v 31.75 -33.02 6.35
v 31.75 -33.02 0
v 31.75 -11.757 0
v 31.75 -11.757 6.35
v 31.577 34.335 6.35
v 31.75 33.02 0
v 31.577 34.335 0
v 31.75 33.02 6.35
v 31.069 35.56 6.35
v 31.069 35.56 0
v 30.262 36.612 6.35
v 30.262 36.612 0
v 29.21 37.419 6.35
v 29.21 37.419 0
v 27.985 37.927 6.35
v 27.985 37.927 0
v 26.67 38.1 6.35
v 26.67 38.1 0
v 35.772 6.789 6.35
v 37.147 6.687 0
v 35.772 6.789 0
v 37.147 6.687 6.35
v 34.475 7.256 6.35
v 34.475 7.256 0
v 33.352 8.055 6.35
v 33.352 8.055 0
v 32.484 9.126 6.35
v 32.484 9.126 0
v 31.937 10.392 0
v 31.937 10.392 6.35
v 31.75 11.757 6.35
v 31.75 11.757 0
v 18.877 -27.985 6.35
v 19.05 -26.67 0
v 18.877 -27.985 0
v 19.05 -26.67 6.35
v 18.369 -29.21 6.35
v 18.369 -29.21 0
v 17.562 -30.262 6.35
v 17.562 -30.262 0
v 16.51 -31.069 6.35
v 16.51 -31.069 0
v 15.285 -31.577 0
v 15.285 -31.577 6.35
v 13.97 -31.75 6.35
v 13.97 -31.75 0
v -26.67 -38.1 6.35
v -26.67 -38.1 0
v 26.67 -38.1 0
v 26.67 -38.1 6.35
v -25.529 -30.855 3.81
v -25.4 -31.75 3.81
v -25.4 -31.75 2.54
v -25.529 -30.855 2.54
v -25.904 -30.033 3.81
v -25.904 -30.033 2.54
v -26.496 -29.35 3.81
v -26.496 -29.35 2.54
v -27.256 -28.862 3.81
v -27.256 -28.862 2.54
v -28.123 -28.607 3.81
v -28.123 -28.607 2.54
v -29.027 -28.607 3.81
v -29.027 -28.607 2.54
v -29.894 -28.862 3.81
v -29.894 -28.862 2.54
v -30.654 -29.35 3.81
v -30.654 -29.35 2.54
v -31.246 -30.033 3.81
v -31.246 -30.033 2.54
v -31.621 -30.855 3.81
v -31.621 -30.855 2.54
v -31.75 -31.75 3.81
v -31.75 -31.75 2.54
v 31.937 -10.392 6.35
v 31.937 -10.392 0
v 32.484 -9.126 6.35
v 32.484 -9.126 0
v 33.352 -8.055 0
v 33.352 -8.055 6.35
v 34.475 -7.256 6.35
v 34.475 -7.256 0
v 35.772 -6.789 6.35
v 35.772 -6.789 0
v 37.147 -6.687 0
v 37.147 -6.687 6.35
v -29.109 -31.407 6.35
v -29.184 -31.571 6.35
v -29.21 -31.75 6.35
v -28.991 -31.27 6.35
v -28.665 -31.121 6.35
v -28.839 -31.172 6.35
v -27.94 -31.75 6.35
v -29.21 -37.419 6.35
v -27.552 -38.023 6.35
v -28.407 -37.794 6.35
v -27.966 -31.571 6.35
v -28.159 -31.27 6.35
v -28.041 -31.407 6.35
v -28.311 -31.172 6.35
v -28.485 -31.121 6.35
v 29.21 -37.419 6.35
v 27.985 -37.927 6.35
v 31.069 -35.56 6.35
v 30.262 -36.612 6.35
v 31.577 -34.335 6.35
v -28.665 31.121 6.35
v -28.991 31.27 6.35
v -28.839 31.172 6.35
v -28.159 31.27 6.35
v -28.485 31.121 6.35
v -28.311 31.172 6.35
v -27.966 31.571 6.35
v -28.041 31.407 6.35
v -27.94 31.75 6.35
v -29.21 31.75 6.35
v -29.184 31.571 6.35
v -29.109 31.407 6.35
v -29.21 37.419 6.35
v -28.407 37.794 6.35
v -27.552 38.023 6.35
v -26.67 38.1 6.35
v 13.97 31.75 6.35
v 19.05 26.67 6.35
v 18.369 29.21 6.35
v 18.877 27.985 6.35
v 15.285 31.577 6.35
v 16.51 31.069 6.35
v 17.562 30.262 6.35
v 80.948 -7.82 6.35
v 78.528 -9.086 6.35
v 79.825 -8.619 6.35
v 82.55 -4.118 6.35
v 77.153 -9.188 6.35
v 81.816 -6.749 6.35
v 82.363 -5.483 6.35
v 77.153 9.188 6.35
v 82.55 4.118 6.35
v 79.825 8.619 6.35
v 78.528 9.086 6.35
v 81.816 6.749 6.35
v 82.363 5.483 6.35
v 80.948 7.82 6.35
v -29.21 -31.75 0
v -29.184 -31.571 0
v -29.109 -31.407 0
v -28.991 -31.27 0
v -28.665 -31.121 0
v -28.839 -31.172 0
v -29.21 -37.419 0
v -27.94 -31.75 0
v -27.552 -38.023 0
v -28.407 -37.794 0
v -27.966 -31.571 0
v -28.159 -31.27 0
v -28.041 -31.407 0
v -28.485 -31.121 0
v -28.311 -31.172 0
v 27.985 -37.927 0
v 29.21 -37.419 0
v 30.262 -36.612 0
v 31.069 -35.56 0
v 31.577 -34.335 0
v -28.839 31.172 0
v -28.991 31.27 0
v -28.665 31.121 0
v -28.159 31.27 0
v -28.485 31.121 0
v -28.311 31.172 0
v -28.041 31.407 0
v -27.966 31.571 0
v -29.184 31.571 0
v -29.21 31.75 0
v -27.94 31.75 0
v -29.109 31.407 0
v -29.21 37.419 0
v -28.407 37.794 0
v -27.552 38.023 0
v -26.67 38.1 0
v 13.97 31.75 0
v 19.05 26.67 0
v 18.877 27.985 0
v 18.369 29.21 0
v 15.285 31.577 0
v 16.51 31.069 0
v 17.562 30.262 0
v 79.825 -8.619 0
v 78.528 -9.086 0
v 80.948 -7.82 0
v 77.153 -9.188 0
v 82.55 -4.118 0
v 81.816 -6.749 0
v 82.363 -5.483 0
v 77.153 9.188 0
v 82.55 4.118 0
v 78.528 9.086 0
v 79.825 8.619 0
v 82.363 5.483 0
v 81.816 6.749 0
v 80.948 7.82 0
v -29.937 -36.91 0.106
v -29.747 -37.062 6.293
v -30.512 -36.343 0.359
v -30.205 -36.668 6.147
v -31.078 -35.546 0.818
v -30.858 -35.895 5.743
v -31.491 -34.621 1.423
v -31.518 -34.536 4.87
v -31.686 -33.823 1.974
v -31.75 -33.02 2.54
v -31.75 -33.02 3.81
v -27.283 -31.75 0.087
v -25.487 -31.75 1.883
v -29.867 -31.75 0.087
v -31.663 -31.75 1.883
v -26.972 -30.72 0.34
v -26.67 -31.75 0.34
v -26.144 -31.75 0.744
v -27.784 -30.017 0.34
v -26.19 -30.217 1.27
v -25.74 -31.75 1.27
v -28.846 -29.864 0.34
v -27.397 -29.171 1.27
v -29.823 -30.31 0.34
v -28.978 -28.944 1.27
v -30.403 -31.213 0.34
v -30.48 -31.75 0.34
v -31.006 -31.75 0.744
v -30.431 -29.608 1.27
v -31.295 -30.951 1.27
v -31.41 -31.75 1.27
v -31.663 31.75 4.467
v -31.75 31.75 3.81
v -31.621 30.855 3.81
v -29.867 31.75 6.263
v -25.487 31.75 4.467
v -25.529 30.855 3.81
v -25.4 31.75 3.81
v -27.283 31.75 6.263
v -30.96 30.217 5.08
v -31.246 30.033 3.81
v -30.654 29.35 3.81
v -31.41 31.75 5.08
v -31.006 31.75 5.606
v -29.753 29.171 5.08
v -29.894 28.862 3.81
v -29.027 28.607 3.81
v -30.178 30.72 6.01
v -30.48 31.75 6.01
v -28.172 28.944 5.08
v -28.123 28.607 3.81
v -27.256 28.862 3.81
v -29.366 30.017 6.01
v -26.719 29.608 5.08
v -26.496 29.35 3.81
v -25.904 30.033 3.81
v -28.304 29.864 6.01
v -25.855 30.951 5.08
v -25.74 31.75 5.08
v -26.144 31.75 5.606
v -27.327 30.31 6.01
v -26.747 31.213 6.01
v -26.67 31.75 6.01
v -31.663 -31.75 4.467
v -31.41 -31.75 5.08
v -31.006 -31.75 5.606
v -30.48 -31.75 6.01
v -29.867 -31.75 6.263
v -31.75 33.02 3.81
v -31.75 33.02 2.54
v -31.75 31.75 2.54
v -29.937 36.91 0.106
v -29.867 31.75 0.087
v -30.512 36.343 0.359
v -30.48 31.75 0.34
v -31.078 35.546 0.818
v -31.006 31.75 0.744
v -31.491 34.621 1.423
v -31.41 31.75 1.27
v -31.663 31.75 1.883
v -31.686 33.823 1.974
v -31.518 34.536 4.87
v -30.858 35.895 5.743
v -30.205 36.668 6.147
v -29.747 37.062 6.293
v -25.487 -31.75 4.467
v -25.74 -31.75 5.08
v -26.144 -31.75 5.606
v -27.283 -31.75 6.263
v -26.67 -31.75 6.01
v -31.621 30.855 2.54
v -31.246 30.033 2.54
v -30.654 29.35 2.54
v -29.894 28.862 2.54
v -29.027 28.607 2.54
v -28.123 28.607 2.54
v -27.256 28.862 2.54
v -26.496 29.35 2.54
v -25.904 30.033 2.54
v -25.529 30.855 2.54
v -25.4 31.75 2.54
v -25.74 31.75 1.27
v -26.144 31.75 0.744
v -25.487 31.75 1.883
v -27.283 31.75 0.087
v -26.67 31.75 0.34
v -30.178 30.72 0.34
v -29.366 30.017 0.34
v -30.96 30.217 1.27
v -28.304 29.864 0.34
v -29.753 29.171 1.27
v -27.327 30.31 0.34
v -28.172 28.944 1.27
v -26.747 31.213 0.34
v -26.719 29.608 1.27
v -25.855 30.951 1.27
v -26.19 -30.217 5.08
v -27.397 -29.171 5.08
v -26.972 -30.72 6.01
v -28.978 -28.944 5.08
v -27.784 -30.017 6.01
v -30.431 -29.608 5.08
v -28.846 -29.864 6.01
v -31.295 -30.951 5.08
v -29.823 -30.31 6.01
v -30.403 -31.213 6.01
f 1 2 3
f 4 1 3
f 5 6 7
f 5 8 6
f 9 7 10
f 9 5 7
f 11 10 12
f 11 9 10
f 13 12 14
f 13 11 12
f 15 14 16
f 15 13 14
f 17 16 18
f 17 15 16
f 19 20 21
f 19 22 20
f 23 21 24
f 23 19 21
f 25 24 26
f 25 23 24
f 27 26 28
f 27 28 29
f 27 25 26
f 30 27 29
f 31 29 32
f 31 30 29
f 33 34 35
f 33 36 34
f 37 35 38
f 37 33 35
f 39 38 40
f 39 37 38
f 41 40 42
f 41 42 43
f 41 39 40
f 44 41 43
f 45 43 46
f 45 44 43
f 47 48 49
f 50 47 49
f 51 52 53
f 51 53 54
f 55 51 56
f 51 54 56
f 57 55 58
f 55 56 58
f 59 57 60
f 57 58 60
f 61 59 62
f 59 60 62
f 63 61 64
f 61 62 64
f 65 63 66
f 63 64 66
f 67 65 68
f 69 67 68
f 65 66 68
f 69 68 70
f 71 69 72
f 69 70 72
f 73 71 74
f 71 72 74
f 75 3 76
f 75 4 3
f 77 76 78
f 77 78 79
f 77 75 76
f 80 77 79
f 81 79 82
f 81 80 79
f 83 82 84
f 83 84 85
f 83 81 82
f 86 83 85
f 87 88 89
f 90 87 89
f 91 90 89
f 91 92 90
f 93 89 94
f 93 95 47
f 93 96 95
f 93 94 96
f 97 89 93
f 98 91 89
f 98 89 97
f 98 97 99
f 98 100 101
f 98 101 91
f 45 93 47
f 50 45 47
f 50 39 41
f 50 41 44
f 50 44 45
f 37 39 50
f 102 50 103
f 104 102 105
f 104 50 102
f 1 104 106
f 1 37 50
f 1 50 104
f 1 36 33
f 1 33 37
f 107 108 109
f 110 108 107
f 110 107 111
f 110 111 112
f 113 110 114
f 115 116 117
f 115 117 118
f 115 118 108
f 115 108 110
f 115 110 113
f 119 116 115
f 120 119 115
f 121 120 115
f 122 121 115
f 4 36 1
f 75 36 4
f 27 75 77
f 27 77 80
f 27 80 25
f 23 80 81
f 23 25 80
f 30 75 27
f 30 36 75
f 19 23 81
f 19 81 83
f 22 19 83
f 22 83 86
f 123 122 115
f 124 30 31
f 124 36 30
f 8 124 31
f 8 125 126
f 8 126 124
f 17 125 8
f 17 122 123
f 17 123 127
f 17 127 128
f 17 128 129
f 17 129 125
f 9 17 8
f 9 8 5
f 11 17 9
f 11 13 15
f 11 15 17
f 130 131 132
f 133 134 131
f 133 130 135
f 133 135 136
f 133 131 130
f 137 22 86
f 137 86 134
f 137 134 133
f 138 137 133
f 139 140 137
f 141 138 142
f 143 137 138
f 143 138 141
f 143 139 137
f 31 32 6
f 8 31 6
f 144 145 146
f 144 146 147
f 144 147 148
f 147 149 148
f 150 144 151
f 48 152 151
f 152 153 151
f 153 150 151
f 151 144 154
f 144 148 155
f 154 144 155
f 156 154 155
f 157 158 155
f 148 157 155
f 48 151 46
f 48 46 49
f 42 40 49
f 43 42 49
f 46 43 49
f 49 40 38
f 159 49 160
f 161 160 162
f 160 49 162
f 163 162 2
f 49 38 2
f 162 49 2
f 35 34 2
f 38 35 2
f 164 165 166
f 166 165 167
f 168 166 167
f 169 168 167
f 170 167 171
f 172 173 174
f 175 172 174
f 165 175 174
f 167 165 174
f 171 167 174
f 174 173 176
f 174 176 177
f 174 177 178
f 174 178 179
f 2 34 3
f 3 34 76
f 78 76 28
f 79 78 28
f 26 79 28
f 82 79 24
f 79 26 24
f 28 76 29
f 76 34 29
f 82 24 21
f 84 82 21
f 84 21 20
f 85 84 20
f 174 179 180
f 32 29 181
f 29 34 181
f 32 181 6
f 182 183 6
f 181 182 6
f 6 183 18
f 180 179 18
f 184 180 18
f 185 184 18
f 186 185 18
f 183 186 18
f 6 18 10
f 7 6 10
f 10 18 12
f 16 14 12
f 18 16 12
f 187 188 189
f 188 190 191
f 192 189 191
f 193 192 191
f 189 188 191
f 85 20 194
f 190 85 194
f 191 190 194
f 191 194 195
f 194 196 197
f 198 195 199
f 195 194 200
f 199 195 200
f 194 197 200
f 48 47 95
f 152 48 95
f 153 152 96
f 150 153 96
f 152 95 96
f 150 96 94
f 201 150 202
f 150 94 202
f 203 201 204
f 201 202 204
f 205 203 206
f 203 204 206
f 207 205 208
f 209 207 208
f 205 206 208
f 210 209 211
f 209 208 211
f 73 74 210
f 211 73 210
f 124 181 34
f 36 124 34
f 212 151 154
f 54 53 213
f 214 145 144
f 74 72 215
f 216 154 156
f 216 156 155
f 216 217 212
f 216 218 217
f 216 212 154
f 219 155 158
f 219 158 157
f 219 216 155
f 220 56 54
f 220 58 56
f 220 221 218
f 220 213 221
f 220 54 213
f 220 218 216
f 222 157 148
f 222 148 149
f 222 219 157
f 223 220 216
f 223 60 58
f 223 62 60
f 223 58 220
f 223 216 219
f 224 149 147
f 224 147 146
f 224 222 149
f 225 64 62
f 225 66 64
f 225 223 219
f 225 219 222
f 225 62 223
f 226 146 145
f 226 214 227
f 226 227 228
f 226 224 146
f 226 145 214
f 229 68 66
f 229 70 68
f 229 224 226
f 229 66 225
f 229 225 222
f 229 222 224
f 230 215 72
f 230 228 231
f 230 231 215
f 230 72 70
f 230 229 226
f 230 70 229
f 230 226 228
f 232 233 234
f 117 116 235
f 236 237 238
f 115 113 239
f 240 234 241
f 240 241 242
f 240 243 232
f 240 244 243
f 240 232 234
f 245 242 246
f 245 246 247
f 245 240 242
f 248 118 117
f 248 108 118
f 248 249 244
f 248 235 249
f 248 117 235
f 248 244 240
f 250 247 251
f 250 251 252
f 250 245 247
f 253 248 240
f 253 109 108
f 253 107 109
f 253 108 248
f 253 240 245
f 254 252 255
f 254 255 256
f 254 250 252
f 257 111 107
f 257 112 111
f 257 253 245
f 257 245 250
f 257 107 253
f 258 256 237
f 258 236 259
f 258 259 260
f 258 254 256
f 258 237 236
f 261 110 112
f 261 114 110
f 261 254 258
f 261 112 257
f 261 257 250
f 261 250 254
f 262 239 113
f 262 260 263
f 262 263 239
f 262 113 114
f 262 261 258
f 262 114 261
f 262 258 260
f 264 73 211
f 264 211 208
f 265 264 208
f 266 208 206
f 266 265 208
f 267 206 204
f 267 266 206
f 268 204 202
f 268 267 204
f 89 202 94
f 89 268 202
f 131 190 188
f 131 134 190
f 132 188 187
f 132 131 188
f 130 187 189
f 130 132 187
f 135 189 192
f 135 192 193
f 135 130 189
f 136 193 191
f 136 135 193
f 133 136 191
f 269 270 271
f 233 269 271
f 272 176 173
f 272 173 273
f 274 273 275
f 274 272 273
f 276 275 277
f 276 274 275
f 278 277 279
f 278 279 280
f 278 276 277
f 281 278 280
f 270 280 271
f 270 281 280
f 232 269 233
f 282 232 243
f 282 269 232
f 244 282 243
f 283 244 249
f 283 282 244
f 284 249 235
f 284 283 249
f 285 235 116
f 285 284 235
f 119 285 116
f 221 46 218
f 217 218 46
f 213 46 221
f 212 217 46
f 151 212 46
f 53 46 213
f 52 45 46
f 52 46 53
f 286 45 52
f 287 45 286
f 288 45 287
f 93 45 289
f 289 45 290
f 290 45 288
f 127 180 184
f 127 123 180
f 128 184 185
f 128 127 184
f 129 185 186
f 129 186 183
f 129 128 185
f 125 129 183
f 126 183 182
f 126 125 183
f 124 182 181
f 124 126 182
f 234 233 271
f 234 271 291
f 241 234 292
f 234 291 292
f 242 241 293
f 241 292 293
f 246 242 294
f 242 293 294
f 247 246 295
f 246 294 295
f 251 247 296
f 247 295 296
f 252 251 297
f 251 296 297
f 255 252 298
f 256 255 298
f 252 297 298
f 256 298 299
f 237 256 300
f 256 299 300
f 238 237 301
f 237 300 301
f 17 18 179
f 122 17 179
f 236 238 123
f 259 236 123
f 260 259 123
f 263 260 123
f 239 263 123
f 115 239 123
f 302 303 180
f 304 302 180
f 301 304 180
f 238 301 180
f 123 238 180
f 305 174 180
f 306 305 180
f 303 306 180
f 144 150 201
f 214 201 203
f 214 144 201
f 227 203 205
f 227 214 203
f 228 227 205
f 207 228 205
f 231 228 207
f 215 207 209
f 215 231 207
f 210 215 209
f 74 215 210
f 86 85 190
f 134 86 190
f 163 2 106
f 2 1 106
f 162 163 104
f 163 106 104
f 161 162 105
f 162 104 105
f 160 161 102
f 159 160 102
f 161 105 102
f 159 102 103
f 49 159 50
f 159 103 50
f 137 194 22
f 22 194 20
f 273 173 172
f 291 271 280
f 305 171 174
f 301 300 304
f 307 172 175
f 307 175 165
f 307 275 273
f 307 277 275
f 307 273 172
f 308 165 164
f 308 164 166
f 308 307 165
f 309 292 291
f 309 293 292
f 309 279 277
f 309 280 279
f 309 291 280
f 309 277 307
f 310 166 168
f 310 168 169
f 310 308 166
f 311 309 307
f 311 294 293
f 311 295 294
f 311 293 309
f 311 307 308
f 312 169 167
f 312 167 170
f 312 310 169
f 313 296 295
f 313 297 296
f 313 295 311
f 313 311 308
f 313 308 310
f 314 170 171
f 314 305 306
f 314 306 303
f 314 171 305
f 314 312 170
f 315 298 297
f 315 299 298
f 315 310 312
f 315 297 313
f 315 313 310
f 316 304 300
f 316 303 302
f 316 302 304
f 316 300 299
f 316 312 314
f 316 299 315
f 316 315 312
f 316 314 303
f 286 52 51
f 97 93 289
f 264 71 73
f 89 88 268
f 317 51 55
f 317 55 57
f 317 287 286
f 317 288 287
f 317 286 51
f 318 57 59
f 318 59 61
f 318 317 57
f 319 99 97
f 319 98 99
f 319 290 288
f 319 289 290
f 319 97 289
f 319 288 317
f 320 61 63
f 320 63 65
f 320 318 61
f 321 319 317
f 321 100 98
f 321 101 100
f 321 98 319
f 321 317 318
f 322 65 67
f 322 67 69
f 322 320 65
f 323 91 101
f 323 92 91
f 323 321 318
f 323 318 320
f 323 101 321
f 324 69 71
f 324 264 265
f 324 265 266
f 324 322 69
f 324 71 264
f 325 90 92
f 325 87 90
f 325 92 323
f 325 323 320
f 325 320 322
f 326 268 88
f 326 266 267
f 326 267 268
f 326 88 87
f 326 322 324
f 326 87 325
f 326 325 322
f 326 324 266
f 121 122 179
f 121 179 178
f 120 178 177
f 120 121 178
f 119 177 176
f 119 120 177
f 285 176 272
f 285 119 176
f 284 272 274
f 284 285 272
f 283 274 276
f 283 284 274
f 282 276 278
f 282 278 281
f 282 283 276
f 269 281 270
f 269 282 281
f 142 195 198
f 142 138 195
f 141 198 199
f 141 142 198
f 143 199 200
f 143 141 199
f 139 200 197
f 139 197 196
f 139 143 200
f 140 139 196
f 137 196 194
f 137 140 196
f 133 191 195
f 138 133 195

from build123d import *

# Parameters (mm, degrees)
F1_DEPTH     = 6.35
F2_F1_R      = 5.08
F2_F2_R      = 5.08
F3_T1_DEPTH  = 7.62
F3_T3_DEPTH  = 7.62
F3_T6_ANGLE  = 180
F3_T8_ANGLE  = 180
F3_T10_ANGLE = 180
F3_T12_ANGLE = 180


# Not quite as in the source:
# - a fillet or chamfer that OpenCascade refuses, or shapes differently, is made with other operations: its cross-section is extruded or revolved along the edge and cut away or added


with BuildPart() as f1:
    # F0 (on Top) → F1 (new body)
    with BuildSketch(Plane.XY):
        with BuildLine():
            Line((-31.75, -38.1), (31.75, -38.1))
            Line((31.75, -38.1), (31.75, -6.35))
            Line((31.75, -6.35), (82.55, -9.525))
            Line((82.55, -9.525), (82.55, 9.525))
            Line((82.55, 9.525), (31.75, 6.35))
            Line((31.75, 6.35), (31.75, 38.1))
            Line((31.75, 38.1), (-31.75, 38.1))
            Line((-31.75, 38.1), (-31.75, 31.75))
            ThreePointArc((-31.75, 31.75), (-28.575, 28.575), (-25.4, 31.75))
            Line((-25.4, 31.75), (19.05, 31.75))
            Line((19.05, 31.75), (19.05, -31.75))
            Line((19.05, -31.75), (-25.4, -31.75))
            ThreePointArc((-25.4, -31.75), (-28.575, -28.575), (-31.75, -31.75))
            Line((-31.75, -31.75), (-31.75, -38.1))
        make_face()
    extrude(amount=F1_DEPTH)

    # F2: fillet of radius 5.08 on 10 edges, made by hand

    # F2_f1
    f2_f1_edges = [f1.edges().sort_by_distance(p)[0] for p in [
        (19.05, -31.75, 3.175),
        (31.75, 6.35, 3.175),
        (31.75, -6.35, 3.175),
        (19.05, 31.75, 3.175),
    ]]
    fillet(f2_f1_edges, radius=F2_F1_R)

    # F2_f2
    f2_f2_edges = [f1.edges().sort_by_distance(p)[0] for p in [
        (31.75, -38.1, 3.175),
        (-31.75, -38.1, 3.175),
        (82.55, -9.525, 3.175),
        (82.55, 9.525, 3.175),
        (31.75, 38.1, 3.175),
        (-31.75, 38.1, 3.175),
    ]]
    fillet(f2_f2_edges, radius=F2_F2_R)

    # F3: fillet of radius 2.54 on 8 edges, made by hand

    # F3_s2 → F3_t1 (cut)
    with BuildSketch(Plane.XZ.offset(-39.37)):
        with BuildLine():
            ThreePointArc((-31.75, 3.81), (-31.0060512242, 5.6060512242), (-29.21, 6.35))
            Line((-29.21, 6.35), (-31.75, 6.35))
            Line((-31.75, 6.35), (-31.75, 3.81))
        make_face()
        with BuildLine():
            ThreePointArc((-29.21, 0), (-31.0060512242, 0.7439487758), (-31.75, 2.54))
            Line((-31.75, 2.54), (-31.75, 0))
            Line((-31.75, 0), (-29.21, 0))
        make_face()
    extrude(amount=F3_T1_DEPTH, mode=Mode.SUBTRACT)

    # F3_s4 → F3_t3 (cut)
    with BuildSketch(Plane.XZ.offset(31.75)):
        with BuildLine():
            ThreePointArc((-31.75, 3.81), (-31.0060512242, 5.6060512242), (-29.21, 6.35))
            Line((-29.21, 6.35), (-31.75, 6.35))
            Line((-31.75, 6.35), (-31.75, 3.81))
        make_face()
        with BuildLine():
            ThreePointArc((-29.21, 0), (-31.0060512242, 0.7439487758), (-31.75, 2.54))
            Line((-31.75, 2.54), (-31.75, 0))
            Line((-31.75, 0), (-29.21, 0))
        make_face()
    extrude(amount=F3_T3_DEPTH, mode=Mode.SUBTRACT)

    # F3_s5 → F3_t6 (revolve, cut)
    with BuildSketch(Plane.XZ.offset(-31.75)):
        with BuildLine():
            ThreePointArc((-31.75, 3.81), (-31.0060512242, 5.6060512242), (-29.21, 6.35))
            Line((-29.21, 6.35), (-31.75, 6.35))
            Line((-31.75, 6.35), (-31.75, 3.81))
        make_face()
    revolve(axis=Axis((-28.575, 31.75, 6.35), (0, 0, 1)), revolution_arc=F3_T6_ANGLE, mode=Mode.SUBTRACT)

    # F3_s7 → F3_t8 (revolve, cut)
    with BuildSketch(Plane.XZ.offset(-31.75)):
        with BuildLine():
            ThreePointArc((-29.21, 0), (-31.0060512242, 0.7439487758), (-31.75, 2.54))
            Line((-31.75, 2.54), (-31.75, 0))
            Line((-31.75, 0), (-29.21, 0))
        make_face()
    revolve(axis=Axis((-28.575, 31.75, 0), (0, 0, 1)), revolution_arc=F3_T8_ANGLE, mode=Mode.SUBTRACT)

    # F3_s9 → F3_t10 (revolve, cut)
    with BuildSketch(Plane.XZ.offset(31.75)):
        with BuildLine():
            ThreePointArc((-25.4, 3.81), (-26.1439487758, 5.6060512242), (-27.94, 6.35))
            Line((-27.94, 6.35), (-25.4, 6.35))
            Line((-25.4, 6.35), (-25.4, 3.81))
        make_face()
    revolve(axis=Axis((-28.575, -31.75, 6.35), (0, 0, 1)), revolution_arc=F3_T10_ANGLE, mode=Mode.SUBTRACT)

    # F3_s11 → F3_t12 (revolve, cut)
    with BuildSketch(Plane.XZ.offset(31.75)):
        with BuildLine():
            ThreePointArc((-27.94, 0), (-26.1439487758, 0.7439487758), (-25.4, 2.54))
            Line((-25.4, 2.54), (-25.4, 0))
            Line((-25.4, 0), (-27.94, 0))
        make_face()
    revolve(axis=Axis((-28.575, -31.75, 0), (0, 0, 1)), revolution_arc=F3_T12_ANGLE, mode=Mode.SUBTRACT)


solid = f1.part
